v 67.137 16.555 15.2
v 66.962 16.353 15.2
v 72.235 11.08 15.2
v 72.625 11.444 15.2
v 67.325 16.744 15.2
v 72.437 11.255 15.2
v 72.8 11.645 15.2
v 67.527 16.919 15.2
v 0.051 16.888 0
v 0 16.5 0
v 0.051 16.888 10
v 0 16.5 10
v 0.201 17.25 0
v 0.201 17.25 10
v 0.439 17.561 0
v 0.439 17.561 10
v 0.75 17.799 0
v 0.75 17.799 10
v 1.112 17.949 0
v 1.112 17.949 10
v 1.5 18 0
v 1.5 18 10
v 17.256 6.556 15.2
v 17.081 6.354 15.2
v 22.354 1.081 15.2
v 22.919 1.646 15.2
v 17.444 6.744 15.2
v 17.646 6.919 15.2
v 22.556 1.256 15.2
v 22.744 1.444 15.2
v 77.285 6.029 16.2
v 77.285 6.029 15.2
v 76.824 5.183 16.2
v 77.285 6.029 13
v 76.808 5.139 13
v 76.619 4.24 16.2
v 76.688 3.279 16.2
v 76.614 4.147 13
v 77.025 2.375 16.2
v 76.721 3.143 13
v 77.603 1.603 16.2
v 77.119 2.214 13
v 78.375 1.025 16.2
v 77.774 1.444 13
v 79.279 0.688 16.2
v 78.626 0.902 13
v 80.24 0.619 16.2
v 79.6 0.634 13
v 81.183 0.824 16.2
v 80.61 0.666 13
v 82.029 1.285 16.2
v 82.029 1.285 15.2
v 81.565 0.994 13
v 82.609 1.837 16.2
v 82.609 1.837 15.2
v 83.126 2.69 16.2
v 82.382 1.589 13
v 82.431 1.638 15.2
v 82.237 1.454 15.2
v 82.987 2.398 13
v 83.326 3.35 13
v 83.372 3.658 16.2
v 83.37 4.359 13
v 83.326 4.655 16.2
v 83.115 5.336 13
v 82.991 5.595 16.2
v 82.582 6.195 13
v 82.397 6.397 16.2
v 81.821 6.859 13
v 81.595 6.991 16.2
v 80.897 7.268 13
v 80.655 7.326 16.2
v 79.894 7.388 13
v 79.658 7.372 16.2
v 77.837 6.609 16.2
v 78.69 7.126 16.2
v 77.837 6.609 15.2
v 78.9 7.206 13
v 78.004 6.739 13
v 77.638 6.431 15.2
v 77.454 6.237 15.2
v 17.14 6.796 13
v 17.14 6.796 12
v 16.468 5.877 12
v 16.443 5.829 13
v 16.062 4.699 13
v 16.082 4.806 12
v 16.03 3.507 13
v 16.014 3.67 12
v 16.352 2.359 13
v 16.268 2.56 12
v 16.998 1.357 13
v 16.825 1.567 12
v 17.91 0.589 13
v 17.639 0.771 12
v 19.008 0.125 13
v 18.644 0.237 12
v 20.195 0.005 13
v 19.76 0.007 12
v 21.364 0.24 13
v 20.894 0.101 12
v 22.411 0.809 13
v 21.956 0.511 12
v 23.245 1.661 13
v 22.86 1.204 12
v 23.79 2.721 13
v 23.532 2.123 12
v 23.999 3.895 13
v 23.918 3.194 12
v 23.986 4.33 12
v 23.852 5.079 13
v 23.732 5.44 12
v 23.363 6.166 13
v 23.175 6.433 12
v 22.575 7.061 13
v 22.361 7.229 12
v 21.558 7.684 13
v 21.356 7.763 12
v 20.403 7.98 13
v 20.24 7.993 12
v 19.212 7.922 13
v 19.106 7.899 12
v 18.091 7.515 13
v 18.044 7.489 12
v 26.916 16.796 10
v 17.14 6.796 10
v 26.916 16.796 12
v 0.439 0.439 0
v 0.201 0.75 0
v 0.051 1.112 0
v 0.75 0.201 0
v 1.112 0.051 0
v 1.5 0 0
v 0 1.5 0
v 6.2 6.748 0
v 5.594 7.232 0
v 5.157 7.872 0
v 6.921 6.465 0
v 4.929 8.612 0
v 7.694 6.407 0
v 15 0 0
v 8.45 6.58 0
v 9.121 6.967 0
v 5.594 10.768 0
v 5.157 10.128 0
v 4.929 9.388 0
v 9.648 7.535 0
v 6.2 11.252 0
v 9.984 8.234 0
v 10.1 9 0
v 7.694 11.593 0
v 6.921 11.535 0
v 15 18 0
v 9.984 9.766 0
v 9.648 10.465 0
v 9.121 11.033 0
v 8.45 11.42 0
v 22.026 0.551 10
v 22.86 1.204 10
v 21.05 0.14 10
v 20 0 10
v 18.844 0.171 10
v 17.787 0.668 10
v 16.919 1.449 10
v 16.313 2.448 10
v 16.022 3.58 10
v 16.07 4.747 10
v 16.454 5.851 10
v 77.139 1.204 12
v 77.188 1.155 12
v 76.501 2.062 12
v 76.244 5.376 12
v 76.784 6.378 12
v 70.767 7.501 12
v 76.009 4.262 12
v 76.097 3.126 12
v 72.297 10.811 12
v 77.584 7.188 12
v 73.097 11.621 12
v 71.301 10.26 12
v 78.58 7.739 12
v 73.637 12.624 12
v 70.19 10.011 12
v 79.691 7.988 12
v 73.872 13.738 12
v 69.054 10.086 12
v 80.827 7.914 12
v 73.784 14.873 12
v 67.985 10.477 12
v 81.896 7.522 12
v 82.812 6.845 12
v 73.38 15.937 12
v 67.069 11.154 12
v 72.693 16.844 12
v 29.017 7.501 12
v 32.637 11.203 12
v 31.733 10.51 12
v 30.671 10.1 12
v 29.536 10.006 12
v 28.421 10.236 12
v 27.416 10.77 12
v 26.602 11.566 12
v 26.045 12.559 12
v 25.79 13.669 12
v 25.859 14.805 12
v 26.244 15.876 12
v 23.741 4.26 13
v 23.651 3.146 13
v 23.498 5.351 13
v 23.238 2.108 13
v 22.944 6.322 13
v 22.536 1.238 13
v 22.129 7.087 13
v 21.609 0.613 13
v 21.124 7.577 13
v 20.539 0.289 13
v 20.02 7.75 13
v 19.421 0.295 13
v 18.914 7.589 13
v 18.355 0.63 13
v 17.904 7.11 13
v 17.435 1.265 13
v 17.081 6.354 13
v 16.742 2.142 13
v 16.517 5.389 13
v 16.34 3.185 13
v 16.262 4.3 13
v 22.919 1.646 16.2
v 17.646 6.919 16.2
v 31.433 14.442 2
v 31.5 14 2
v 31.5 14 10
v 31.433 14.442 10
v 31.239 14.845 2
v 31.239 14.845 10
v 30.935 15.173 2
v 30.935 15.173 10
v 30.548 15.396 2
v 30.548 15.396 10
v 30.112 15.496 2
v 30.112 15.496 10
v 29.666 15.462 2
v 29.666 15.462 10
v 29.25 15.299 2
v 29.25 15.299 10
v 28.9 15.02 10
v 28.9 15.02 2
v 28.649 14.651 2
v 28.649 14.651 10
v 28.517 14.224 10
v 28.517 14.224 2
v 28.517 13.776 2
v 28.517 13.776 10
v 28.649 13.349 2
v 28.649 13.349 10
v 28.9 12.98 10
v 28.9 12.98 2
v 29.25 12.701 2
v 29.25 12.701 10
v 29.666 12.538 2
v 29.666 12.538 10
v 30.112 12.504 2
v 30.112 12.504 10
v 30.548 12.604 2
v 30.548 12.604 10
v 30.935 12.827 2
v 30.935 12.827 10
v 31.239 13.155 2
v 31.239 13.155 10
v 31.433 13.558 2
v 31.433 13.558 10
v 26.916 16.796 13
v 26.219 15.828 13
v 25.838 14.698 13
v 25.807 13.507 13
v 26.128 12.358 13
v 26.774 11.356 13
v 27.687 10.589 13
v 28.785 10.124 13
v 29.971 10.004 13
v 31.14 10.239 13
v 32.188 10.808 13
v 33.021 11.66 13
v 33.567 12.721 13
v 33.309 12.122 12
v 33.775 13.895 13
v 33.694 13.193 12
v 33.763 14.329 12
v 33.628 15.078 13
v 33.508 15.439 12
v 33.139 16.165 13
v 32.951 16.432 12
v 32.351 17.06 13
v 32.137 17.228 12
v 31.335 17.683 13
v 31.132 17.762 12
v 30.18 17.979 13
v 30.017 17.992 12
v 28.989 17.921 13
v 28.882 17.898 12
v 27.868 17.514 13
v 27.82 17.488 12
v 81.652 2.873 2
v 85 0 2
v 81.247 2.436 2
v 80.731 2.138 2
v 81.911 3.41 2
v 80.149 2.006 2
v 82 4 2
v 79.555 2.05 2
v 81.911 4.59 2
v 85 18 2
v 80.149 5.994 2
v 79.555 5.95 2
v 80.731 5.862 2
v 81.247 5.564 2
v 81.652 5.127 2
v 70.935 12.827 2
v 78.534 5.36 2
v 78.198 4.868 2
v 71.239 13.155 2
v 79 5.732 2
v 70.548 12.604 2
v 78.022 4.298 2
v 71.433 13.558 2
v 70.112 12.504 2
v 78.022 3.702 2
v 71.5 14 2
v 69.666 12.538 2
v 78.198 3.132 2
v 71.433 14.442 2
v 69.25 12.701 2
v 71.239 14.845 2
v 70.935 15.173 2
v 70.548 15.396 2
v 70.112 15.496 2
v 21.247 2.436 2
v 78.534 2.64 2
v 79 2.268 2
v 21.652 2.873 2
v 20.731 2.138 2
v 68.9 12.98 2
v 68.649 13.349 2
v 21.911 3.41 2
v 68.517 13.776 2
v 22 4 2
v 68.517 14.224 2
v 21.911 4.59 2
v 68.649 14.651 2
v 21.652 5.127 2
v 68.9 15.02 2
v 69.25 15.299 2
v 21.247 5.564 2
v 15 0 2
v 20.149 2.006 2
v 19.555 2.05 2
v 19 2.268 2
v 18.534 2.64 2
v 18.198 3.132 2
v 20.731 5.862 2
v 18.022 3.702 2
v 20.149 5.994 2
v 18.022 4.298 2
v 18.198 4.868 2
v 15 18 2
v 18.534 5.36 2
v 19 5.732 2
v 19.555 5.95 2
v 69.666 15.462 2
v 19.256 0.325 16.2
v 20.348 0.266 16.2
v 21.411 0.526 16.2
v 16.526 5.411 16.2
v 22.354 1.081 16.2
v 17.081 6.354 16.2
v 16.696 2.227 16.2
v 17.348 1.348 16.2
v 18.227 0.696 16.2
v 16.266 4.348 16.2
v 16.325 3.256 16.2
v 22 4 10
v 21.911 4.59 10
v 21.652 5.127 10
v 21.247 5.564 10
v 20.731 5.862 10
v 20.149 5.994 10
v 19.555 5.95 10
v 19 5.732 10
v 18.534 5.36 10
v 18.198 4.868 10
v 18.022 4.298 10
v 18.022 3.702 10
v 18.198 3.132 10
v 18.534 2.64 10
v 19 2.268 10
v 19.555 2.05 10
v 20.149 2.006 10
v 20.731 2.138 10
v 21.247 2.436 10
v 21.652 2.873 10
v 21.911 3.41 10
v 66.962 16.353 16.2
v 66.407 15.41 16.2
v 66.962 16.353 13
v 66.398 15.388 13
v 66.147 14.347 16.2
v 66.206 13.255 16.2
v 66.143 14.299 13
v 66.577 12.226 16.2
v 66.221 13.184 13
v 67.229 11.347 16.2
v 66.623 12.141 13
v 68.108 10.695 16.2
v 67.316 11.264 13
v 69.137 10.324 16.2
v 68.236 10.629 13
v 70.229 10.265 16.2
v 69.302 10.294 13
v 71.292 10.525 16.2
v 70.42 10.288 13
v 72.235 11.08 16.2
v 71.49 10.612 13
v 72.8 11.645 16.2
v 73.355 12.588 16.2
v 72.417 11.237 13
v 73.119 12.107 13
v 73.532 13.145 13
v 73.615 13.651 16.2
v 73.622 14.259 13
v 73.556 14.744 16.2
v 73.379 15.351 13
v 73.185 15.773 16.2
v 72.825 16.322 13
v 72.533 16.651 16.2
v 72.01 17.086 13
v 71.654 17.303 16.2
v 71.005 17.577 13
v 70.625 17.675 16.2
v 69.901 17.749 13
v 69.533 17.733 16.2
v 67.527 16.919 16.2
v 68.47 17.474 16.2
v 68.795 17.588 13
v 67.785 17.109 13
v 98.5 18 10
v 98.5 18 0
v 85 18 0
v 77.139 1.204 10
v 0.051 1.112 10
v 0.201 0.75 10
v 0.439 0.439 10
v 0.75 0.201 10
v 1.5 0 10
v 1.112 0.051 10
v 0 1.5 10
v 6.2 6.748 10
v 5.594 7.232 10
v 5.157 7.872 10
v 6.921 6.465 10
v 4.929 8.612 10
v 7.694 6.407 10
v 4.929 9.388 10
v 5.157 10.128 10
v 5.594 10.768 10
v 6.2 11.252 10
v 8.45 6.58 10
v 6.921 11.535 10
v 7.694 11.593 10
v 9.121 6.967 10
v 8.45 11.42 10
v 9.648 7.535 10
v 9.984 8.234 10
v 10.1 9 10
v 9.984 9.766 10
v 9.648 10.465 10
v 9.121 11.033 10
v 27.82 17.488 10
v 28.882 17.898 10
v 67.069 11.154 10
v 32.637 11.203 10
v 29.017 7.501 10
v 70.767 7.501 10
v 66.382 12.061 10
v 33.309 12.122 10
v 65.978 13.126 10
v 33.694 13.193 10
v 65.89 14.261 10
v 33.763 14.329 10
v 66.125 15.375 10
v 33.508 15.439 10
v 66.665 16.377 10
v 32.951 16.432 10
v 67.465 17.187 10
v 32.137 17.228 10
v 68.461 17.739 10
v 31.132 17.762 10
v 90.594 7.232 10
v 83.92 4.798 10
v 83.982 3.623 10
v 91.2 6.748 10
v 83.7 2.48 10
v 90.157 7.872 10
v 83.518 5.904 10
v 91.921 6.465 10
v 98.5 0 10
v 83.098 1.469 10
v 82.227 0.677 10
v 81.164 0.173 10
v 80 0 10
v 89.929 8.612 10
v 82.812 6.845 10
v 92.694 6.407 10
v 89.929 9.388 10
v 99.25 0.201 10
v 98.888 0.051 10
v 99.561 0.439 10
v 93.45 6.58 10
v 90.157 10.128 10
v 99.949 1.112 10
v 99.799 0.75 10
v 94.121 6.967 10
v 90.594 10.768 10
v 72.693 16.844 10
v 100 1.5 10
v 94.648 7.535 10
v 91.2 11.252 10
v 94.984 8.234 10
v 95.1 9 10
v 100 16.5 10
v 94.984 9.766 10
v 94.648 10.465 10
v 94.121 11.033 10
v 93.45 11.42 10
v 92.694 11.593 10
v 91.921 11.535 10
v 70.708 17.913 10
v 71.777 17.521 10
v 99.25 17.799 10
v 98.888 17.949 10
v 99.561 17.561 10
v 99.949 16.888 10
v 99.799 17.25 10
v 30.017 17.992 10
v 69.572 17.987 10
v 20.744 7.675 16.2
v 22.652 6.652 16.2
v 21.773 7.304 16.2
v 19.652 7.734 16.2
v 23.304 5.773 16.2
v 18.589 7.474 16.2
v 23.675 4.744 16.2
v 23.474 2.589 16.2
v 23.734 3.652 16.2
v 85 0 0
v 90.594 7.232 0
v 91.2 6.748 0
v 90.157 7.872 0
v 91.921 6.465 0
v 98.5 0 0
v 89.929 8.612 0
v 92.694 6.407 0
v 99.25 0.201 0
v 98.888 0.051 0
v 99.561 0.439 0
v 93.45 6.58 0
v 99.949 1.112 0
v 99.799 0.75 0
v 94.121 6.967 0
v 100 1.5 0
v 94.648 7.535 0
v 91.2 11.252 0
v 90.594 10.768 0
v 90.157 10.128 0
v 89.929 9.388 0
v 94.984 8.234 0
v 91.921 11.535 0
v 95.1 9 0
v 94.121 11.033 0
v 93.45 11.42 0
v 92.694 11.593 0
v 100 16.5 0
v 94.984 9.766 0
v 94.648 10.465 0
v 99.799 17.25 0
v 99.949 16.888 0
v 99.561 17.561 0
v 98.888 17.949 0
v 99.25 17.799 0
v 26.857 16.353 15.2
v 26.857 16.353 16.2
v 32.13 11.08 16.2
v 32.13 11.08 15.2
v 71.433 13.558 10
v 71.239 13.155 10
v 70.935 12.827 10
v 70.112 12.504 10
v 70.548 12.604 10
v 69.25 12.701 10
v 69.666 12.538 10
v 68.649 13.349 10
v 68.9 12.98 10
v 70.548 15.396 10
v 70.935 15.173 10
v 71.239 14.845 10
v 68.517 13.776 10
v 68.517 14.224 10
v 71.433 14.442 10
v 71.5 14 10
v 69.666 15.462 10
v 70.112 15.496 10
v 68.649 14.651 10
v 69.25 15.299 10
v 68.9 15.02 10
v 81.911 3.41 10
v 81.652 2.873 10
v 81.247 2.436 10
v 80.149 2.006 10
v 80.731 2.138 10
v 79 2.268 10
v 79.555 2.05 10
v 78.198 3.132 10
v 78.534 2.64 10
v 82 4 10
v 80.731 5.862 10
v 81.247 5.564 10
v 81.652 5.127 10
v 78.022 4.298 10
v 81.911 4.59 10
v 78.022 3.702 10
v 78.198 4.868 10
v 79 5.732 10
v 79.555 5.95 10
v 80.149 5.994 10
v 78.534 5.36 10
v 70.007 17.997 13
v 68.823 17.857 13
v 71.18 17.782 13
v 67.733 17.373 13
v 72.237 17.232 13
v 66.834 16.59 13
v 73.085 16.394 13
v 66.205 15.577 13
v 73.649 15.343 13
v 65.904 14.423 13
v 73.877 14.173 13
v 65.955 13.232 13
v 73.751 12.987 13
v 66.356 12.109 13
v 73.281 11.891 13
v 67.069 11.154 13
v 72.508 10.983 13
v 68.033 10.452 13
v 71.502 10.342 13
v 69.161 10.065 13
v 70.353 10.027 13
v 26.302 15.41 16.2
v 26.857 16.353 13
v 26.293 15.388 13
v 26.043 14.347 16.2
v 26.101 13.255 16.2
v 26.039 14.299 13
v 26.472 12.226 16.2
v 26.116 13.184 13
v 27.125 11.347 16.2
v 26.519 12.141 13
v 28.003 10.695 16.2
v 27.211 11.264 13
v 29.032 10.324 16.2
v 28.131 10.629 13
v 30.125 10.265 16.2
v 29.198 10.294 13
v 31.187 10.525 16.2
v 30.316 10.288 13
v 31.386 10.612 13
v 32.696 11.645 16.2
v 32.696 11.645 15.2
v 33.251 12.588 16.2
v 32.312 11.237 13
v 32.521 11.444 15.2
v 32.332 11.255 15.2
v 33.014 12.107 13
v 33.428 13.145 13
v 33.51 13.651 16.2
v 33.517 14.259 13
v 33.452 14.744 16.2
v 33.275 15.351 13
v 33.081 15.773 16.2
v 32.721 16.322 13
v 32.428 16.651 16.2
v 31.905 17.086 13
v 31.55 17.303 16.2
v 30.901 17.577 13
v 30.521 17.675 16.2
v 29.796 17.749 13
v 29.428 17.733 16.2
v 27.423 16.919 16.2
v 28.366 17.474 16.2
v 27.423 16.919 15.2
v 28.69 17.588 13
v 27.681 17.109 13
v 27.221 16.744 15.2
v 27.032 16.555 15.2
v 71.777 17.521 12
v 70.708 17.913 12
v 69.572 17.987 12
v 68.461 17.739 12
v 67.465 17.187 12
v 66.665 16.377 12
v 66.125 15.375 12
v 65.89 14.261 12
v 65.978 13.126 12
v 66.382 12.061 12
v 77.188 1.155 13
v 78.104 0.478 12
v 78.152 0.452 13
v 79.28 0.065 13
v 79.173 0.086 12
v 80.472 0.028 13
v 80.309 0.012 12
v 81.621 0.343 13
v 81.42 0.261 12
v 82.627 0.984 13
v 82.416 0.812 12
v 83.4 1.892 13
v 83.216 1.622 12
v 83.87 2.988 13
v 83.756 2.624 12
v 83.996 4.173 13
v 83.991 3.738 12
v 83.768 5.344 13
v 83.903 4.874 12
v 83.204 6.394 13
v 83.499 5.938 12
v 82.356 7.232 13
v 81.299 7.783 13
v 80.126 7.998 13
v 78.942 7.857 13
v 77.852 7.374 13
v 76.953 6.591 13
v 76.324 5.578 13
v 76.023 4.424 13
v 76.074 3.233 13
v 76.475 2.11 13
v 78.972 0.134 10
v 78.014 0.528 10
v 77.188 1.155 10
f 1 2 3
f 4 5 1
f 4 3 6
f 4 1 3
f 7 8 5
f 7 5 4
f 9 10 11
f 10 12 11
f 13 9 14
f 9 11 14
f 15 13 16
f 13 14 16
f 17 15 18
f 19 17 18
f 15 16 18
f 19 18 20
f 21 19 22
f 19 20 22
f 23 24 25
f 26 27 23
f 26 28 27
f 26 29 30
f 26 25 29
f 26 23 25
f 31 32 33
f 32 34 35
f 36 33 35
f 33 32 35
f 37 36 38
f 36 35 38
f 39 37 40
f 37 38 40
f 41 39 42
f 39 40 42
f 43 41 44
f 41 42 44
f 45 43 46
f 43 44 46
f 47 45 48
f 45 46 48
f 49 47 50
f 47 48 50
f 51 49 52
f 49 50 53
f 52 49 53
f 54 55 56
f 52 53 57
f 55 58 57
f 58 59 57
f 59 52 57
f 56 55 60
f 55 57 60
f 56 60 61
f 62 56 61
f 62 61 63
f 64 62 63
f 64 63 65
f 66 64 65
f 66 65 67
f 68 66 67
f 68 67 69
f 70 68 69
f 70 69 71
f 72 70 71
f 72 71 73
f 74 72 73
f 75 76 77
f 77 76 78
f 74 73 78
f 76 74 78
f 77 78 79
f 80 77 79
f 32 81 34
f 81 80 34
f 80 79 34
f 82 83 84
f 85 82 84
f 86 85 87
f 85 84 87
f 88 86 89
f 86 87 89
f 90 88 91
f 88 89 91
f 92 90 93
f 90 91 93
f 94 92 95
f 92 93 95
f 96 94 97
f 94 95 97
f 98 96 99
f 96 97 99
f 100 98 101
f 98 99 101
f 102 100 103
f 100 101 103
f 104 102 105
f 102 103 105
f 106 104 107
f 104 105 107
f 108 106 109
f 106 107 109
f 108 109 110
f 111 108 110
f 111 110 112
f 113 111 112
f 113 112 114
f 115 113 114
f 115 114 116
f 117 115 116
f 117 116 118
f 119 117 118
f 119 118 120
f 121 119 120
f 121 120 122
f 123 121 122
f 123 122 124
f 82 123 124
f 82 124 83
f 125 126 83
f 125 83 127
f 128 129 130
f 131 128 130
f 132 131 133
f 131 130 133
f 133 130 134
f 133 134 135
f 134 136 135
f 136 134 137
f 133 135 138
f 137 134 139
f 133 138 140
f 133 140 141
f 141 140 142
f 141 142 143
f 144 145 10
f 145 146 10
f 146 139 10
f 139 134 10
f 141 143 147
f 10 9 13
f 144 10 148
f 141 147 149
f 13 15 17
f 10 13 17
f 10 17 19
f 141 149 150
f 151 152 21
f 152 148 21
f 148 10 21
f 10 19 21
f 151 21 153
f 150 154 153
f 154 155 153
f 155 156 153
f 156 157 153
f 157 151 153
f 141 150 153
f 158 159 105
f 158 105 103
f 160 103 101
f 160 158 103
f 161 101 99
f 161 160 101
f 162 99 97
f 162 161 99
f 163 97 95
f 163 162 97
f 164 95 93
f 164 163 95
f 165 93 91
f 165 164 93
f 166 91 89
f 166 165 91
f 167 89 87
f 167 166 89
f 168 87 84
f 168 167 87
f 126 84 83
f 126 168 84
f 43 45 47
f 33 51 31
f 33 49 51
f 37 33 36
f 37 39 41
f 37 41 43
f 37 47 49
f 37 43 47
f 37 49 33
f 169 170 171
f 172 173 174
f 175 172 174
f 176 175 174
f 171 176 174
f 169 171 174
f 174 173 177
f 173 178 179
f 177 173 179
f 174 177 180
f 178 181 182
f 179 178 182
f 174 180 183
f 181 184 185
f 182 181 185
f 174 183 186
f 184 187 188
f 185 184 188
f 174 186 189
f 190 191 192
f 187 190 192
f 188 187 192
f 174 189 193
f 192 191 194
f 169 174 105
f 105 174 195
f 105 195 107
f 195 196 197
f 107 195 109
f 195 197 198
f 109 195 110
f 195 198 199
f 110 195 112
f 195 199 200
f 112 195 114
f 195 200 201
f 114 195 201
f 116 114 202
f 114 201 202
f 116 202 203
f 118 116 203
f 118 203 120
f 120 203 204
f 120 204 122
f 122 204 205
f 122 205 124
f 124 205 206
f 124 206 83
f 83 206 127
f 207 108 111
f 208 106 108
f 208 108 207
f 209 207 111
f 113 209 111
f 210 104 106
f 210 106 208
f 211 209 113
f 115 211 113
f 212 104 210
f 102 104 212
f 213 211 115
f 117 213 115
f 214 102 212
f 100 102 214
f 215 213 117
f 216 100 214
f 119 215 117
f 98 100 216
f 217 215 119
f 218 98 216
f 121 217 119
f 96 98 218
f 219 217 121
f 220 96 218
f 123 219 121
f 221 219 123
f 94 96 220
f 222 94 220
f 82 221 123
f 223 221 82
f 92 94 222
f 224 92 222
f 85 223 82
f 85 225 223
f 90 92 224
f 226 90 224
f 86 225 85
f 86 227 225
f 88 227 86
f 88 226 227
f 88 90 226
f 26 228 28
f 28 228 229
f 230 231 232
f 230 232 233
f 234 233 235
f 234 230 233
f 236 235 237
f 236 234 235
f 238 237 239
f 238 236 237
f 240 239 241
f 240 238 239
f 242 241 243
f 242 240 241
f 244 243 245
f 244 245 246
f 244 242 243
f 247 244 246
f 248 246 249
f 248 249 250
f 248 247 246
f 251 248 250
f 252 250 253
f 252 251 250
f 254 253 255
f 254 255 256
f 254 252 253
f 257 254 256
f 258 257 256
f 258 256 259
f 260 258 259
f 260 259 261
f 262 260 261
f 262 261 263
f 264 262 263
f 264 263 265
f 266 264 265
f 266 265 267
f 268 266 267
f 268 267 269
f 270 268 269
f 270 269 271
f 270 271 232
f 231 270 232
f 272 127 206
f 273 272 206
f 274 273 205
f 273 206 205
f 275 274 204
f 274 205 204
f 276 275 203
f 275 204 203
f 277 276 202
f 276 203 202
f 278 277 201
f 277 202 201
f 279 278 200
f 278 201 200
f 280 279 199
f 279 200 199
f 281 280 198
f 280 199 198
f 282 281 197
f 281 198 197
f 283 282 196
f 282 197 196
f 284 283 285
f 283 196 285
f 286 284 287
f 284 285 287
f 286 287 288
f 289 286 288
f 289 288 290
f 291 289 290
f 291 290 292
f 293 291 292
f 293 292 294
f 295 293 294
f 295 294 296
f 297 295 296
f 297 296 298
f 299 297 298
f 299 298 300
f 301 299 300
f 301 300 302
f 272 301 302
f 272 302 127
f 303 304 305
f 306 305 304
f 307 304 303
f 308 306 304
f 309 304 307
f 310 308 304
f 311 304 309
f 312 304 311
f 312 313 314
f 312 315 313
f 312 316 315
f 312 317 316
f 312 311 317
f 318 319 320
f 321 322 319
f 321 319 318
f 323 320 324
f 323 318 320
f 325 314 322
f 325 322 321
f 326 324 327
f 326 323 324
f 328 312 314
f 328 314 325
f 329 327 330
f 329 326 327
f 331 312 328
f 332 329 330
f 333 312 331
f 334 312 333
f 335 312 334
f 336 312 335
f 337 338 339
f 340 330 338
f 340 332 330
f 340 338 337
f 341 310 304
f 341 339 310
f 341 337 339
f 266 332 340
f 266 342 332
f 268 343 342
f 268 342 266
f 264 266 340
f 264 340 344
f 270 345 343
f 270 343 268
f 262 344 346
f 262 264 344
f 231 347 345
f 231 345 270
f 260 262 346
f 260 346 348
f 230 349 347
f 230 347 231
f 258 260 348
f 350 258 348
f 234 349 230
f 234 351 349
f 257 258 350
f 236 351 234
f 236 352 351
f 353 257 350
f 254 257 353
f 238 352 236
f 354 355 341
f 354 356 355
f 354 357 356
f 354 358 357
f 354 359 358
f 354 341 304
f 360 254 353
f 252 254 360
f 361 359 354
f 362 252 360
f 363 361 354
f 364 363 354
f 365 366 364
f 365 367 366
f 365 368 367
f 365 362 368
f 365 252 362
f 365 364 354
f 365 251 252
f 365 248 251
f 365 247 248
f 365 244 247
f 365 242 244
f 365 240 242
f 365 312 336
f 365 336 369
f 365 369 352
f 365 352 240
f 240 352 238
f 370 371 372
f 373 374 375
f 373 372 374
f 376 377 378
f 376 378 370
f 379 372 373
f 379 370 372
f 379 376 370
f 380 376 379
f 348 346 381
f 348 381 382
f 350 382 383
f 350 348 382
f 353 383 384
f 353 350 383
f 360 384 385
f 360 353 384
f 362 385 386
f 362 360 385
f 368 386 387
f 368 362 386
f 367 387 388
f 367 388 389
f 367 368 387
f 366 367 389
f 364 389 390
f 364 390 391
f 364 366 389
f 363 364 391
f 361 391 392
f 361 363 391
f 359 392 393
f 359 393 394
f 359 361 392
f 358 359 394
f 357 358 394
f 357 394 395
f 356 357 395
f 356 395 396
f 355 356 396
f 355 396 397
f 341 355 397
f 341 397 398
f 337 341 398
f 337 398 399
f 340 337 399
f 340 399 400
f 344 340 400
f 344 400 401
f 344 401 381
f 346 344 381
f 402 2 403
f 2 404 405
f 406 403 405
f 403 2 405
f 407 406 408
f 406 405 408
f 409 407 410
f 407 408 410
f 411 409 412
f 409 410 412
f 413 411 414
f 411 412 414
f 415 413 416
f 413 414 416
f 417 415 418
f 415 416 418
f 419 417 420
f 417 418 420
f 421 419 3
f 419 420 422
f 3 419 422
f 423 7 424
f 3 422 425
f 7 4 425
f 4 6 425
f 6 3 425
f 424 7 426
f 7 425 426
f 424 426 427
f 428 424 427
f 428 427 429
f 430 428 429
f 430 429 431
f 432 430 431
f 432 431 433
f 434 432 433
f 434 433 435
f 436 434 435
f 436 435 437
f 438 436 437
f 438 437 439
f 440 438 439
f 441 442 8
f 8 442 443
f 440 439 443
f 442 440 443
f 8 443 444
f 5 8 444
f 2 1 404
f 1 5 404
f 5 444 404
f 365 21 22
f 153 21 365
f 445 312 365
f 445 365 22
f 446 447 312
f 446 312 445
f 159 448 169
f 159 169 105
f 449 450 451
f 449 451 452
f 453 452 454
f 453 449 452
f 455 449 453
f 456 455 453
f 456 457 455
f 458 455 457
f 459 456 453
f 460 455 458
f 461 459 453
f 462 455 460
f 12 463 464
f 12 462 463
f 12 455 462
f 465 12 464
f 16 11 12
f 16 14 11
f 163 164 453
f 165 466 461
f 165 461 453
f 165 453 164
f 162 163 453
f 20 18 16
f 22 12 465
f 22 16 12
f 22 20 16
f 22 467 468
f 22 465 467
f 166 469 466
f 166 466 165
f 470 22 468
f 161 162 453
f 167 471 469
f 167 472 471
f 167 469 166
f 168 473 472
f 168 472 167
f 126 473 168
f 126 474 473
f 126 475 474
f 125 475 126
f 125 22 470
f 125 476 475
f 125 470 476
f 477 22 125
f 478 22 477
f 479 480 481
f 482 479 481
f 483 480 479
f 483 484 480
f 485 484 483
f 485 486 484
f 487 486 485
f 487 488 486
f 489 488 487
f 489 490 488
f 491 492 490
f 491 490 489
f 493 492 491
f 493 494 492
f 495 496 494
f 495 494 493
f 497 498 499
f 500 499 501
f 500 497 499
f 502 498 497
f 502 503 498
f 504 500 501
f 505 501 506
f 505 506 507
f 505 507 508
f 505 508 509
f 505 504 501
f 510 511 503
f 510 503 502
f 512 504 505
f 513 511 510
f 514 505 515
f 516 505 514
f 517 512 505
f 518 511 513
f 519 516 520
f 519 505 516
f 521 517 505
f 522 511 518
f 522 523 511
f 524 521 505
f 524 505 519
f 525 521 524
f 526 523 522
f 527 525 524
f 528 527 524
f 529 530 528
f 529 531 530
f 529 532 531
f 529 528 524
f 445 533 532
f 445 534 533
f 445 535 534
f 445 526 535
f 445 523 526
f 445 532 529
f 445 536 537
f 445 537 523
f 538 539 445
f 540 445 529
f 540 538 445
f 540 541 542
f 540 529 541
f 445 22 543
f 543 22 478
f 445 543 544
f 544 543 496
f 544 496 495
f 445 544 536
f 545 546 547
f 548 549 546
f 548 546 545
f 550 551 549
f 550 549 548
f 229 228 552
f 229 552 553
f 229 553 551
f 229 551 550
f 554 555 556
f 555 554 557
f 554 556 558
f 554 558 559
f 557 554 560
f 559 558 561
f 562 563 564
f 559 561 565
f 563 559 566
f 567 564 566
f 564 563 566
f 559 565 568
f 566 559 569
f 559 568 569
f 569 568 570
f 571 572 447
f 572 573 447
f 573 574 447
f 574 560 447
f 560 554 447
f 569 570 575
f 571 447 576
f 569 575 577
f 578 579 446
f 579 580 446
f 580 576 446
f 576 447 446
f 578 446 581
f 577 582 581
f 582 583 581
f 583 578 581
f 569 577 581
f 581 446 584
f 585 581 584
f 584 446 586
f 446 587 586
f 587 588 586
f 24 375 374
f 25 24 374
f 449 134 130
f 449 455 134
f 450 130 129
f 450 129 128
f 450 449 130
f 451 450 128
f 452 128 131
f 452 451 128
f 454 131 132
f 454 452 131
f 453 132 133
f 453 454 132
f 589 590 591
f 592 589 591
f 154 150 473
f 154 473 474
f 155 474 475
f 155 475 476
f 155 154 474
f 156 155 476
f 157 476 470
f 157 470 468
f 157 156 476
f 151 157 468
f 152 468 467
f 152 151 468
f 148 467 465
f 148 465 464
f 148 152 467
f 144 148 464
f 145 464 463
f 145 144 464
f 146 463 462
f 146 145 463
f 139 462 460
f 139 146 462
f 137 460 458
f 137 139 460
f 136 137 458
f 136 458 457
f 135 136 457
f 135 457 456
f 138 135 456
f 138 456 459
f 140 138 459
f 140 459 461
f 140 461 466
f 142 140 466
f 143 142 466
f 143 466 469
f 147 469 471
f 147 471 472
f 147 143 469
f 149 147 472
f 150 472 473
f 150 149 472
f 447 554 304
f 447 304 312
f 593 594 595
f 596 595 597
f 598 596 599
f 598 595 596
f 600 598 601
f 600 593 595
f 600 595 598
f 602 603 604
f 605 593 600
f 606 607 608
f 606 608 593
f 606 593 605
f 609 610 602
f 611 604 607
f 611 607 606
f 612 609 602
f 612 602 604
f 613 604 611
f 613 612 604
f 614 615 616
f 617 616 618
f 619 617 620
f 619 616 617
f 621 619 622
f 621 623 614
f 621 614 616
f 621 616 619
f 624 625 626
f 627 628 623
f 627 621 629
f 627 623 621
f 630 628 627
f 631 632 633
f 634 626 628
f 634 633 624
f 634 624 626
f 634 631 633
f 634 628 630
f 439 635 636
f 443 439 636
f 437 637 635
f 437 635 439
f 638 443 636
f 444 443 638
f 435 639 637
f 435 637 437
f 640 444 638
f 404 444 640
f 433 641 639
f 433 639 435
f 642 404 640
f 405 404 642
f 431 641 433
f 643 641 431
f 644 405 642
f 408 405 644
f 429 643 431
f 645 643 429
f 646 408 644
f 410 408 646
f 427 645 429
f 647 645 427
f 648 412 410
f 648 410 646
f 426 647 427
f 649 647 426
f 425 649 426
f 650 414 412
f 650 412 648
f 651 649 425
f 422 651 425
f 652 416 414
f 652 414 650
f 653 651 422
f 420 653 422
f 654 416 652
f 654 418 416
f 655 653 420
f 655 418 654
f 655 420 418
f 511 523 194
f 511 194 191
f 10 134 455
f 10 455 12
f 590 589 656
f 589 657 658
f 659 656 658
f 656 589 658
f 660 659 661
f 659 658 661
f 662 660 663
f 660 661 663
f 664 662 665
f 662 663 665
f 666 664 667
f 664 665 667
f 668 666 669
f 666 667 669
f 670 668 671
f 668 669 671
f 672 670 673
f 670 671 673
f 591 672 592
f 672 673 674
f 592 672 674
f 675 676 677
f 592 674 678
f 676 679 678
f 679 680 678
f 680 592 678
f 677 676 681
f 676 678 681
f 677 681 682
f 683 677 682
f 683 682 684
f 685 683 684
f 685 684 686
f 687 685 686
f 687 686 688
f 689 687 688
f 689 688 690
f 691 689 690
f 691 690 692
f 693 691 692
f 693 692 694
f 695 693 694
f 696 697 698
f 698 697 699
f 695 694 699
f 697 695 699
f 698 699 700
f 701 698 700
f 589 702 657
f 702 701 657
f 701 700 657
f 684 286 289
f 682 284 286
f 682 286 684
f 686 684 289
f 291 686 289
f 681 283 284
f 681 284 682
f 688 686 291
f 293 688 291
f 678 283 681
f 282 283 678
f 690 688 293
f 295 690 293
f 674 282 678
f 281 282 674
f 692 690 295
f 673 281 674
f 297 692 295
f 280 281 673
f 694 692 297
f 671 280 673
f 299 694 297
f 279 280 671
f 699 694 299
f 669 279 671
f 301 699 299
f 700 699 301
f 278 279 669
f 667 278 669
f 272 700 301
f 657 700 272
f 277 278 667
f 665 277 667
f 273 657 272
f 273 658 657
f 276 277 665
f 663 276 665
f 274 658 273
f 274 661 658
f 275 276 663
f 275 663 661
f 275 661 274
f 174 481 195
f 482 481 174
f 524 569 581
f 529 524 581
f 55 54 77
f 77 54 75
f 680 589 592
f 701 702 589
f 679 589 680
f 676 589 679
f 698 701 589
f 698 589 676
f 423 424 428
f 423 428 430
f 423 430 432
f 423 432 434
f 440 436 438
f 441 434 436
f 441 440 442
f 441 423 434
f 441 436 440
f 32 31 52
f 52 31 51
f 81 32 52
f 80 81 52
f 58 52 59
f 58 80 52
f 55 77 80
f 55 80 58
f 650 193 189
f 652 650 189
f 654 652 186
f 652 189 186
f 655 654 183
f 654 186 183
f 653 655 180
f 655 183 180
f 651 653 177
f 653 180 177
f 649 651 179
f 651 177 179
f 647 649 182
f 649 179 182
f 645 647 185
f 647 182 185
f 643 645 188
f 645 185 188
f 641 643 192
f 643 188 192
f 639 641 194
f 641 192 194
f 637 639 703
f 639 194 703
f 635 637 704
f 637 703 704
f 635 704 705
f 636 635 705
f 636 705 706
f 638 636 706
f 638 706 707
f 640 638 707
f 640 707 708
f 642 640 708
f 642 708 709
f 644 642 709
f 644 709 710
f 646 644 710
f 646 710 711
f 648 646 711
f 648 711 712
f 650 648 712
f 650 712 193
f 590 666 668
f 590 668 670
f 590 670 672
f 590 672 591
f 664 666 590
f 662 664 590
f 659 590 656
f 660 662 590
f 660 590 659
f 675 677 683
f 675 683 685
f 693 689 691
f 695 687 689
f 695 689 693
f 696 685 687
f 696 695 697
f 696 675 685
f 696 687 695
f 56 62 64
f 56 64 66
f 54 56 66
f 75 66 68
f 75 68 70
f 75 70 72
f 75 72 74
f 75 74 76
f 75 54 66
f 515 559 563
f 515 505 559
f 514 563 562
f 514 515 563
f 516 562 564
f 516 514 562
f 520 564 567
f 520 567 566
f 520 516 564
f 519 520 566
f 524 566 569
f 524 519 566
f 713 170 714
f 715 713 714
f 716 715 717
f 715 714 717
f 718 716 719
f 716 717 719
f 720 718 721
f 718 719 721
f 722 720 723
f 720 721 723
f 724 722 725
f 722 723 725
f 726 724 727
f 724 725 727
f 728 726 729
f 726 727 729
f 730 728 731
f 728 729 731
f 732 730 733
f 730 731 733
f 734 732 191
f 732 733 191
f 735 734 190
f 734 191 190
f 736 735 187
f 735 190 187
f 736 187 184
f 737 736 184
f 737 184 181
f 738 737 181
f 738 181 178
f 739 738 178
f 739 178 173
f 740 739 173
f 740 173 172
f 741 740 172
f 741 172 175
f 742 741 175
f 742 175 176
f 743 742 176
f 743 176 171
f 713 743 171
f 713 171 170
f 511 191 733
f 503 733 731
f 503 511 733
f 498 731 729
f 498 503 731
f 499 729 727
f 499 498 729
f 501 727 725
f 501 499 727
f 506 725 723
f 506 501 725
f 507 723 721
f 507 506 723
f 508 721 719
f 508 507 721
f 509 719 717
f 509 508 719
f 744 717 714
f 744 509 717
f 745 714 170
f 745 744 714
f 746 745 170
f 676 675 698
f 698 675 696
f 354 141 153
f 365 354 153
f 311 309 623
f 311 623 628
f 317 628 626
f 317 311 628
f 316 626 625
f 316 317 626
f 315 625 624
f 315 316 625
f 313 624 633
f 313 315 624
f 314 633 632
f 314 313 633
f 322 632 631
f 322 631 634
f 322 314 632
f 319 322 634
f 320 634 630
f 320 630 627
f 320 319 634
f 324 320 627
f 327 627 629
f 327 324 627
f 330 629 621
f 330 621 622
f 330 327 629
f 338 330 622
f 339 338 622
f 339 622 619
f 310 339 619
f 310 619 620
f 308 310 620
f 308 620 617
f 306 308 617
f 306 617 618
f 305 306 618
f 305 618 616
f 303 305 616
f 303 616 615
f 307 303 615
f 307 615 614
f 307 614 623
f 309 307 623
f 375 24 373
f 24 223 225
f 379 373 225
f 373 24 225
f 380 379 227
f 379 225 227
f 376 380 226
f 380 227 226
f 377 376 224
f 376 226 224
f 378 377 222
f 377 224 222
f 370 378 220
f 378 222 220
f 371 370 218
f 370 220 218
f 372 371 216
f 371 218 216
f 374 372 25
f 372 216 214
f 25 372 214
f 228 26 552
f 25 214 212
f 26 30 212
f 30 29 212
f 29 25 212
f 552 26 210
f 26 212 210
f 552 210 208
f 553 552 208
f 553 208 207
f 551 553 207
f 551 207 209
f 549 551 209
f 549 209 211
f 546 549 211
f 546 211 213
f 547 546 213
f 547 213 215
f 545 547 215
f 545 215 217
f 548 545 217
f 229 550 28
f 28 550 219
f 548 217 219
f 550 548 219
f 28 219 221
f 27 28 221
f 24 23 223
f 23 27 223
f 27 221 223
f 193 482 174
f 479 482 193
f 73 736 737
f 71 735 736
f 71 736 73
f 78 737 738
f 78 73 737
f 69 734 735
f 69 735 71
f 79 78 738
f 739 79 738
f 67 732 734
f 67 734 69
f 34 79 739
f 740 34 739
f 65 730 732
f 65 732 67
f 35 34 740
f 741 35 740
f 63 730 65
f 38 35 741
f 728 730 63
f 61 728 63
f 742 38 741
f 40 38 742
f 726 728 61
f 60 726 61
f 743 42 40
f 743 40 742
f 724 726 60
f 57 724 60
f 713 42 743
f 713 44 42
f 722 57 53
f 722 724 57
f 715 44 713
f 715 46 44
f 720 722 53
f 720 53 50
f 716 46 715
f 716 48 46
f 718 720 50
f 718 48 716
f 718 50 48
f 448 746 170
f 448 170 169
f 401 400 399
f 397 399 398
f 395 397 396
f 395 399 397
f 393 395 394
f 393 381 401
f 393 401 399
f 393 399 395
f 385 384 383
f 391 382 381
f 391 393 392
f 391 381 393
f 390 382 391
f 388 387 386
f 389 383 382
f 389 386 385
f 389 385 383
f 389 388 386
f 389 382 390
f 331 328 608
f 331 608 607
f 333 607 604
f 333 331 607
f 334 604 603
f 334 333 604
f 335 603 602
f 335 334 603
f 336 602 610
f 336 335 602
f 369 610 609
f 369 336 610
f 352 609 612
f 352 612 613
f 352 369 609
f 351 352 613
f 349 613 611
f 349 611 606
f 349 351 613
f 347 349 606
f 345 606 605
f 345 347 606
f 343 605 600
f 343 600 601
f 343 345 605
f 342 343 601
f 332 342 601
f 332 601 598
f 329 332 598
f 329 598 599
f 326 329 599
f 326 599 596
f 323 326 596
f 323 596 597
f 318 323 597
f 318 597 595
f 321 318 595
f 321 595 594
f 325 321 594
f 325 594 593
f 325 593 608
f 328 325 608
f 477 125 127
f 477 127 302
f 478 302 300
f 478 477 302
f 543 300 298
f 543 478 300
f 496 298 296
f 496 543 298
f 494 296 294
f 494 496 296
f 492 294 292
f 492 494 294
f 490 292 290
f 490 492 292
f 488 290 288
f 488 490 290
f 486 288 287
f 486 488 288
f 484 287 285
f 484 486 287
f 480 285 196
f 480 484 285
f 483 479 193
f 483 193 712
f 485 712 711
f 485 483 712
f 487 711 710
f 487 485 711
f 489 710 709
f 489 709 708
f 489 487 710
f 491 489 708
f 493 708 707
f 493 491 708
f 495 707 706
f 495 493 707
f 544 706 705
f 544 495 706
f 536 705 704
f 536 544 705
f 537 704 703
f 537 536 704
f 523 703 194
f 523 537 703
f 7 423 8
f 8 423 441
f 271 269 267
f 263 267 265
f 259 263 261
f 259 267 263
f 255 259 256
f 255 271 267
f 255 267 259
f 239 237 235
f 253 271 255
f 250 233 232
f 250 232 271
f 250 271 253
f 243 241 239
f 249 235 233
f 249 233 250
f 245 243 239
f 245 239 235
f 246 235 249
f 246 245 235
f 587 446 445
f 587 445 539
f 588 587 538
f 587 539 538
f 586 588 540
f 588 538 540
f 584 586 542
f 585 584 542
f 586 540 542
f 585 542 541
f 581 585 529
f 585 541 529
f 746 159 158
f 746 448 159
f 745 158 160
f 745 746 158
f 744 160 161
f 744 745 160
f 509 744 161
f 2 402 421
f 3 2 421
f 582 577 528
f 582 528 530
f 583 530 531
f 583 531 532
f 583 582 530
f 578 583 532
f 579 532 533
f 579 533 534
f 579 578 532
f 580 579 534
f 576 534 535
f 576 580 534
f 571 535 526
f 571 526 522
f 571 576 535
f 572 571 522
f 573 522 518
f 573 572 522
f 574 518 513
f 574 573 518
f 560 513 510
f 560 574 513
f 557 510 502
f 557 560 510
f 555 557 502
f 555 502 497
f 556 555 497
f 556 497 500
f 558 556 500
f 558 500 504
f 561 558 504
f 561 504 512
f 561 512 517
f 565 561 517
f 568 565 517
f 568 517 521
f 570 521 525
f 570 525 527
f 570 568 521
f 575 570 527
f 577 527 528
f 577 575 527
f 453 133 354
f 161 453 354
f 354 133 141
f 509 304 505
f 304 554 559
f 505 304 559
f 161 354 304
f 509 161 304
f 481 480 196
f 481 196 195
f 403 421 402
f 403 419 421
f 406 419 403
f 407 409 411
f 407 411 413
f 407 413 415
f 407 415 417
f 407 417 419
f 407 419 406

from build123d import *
from build123d.topology import SkipClean

# Parameters (mm, degrees)
SKETCH_1_W          = 100
SKETCH_1_H          = 18
SKETCH_1_R          = 2.6
SKETCH_1_R_2        = 2
SKETCH_1_R_3        = 1.5
EXTRUDE_1_DEPTH     = 10
SKETCH_2_W          = 70
SKETCH_2_H          = 18
CUT_EXTRUDE_1_DEPTH = 2
FILLET_1_R          = 1.5
EXTRUDE_3_DEPTH     = 2
SKETCH_4_R          = 4
EXTRUDE_4_DEPTH     = 1
SKETCH_5_R          = 3.38932831
EXTRUDE_5_DEPTH     = 3.2
SKETCH_6_R          = 3.75
EXTRUDE_6_DEPTH     = 3.2
SKETCH_7_R          = 3.75
EXTRUDE_7_DEPTH     = 3.2
SKETCH_8_R          = 3.75
EXTRUDE_8_DEPTH     = 3.2
CUT_EXTRUDE_2_DEPTH = 1
CUT_EXTRUDE_3_DEPTH = 1
CUT_EXTRUDE_4_DEPTH = 1


with BuildPart() as part:
    # Эскиз1 → Вытянуть1 (new body)
    with BuildSketch(Plane.XY):
        with Locations((50, 9)):
            Rectangle(SKETCH_1_W, SKETCH_1_H)
        with Locations((7.5, 9)):
            Circle(SKETCH_1_R, mode=Mode.SUBTRACT)
        with Locations((92.5, 9)):
            Circle(SKETCH_1_R, mode=Mode.SUBTRACT)
        with Locations((20, 4)):
            Circle(SKETCH_1_R_2, mode=Mode.SUBTRACT)
        with Locations((80, 4)):
            Circle(SKETCH_1_R_2, mode=Mode.SUBTRACT)
        with Locations((30, 14)):
            Circle(SKETCH_1_R_3, mode=Mode.SUBTRACT)
        with Locations((70, 14)):
            Circle(SKETCH_1_R_3, mode=Mode.SUBTRACT)
    extrude(amount=EXTRUDE_1_DEPTH)

    # Эскиз2 → Вырез-Вытянуть1 (cut)
    with BuildSketch(Plane(origin=(0, 0, 0), x_dir=(-1, 0, 0), z_dir=(0, 0, -1))):
        with Locations((-50, 9)):
            Rectangle(SKETCH_2_W, SKETCH_2_H)
    extrude(amount=-CUT_EXTRUDE_1_DEPTH, mode=Mode.SUBTRACT)

    # Скругление1
    fillet_1_edges = [part.edges().sort_by_distance(p)[0] for p in [
        (100, 0, 5),
        (0, 0, 5),
        (100, 18, 5),
        (0, 18, 5),
    ]]
    fillet(fillet_1_edges, radius=FILLET_1_R)

    # Эскиз3 → Вытянуть3 (add)
    with BuildSketch(Plane.XY.offset(10)):
        with BuildLine():
            Line((72.692526424, 16.844371856), (82.811526632, 6.845227231))
            ThreePointArc((82.811526632, 6.845227231), (82.845227231, 1.188473368), (77.188473368, 1.154772769))
            Line((77.188473368, 1.154772769), (77.139063674, 1.203597224))
            Line((77.139063674, 1.203597224), (22.860092921, 1.203597224))
            ThreePointArc((22.860092921, 1.203597224), (17.203597224, 1.139907079), (17.139907079, 6.796402776))
            Line((17.139907079, 6.796402776), (26.916385172, 16.795547401))
            ThreePointArc((26.916385172, 16.795547401), (32.572880868, 16.859237546), (32.636571013, 11.20274185))
            Line((32.636571013, 11.20274185), (29.016893244, 7.500623237))
            Line((29.016893244, 7.500623237), (70.766557833, 7.500623237))
            Line((70.766557833, 7.500623237), (67.06947316, 11.153917394))
            ThreePointArc((67.06947316, 11.153917394), (67.035772561, 16.810671257), (72.692526424, 16.844371856))
        make_face()
    extrude(amount=EXTRUDE_3_DEPTH)

    # Эскиз4 → Вытянуть4 (add)
    with SkipClean():  # the faces are left unmerged after this step: merging them gives an invalid solid
        with BuildSketch(Plane.XY.offset(12)):
            with Locations(Location((20, 4, 0), (0, 0, 135.645102996))):
                Circle(SKETCH_4_R)
            with Locations(Location((29.776478092, 13.999144625, 0), (0, 0, 135.645102996))):
                Circle(SKETCH_4_R)
            with Locations(Location((69.880999792, 13.999144625, 0), (0, 0, 225.341340509))):
                Circle(SKETCH_4_R)
            with Locations(Location((80, 4, 0), (0, 0, 225.341340509))):
                Circle(SKETCH_4_R)
        extrude(amount=EXTRUDE_4_DEPTH)
    add(part.part.scale(1), mode=Mode.REPLACE)  # the faces are merged on a copy

    # Эскиз5 → Вытянуть5 (add)
    with BuildSketch(Plane.XY.offset(13)):
        with Locations(Location((80, 4, 0), (0, 0, 143.222791585))):
            Circle(SKETCH_5_R)
    extrude(amount=EXTRUDE_5_DEPTH)

    # Эскиз6 → Вытянуть6 (add)
    with BuildSketch(Plane.XY.offset(13)):
        with Locations(Location((69.880999792, 13.999144625, 0), (0, 0, 141.123198866))):
            Circle(SKETCH_6_R)
    extrude(amount=EXTRUDE_6_DEPTH)

    # Эскиз7 → Вытянуть7 (add)
    with BuildSketch(Plane.XY.offset(13)):
        with Locations(Location((29.776478092, 13.999144625, 0), (0, 0, 141.123198866))):
            Circle(SKETCH_7_R)
    extrude(amount=EXTRUDE_7_DEPTH)

    # Эскиз8 → Вытянуть8 (add)
    with BuildSketch(Plane.XY.offset(13)):
        with Locations(Location((20, 4, 0), (0, 0, 141.123198866))):
            Circle(SKETCH_8_R)
    extrude(amount=EXTRUDE_8_DEPTH)

    # Эскиз9 → Вырез-Вытянуть2 (cut)
    with BuildSketch(Plane.XY.offset(16.2)):
        Polygon((16.157845588, 7.276468987), (24.091280084, -0.656965509), (24.596689062, -0.031003637), (16.723531013, 7.842154412), align=None)
    extrude(amount=-CUT_EXTRUDE_2_DEPTH, mode=Mode.SUBTRACT)

    # Эскиз10 → Вырез-Вытянуть3 (cut)
    with BuildSketch(Plane.XY.offset(16.2)):
        Polygon((23.332366462, 19.877570831), (34.653872269, 8.556065024), (35.333565103, 9.007743039), (23.898051887, 20.443256256), align=None)
    extrude(amount=-CUT_EXTRUDE_3_DEPTH, mode=Mode.SUBTRACT)

    # Эскиз11 → Вырез-Вытянуть4 (cut)
    with BuildSketch(Plane.XY.offset(16.2)):
        Polygon((62.841835451, 20.472623541), (84.739405762, -1.42494677), (85.695784292, -1.249954449), (63.522860335, 20.922969507), align=None)
    extrude(amount=-CUT_EXTRUDE_4_DEPTH, mode=Mode.SUBTRACT)


solid = part.part
